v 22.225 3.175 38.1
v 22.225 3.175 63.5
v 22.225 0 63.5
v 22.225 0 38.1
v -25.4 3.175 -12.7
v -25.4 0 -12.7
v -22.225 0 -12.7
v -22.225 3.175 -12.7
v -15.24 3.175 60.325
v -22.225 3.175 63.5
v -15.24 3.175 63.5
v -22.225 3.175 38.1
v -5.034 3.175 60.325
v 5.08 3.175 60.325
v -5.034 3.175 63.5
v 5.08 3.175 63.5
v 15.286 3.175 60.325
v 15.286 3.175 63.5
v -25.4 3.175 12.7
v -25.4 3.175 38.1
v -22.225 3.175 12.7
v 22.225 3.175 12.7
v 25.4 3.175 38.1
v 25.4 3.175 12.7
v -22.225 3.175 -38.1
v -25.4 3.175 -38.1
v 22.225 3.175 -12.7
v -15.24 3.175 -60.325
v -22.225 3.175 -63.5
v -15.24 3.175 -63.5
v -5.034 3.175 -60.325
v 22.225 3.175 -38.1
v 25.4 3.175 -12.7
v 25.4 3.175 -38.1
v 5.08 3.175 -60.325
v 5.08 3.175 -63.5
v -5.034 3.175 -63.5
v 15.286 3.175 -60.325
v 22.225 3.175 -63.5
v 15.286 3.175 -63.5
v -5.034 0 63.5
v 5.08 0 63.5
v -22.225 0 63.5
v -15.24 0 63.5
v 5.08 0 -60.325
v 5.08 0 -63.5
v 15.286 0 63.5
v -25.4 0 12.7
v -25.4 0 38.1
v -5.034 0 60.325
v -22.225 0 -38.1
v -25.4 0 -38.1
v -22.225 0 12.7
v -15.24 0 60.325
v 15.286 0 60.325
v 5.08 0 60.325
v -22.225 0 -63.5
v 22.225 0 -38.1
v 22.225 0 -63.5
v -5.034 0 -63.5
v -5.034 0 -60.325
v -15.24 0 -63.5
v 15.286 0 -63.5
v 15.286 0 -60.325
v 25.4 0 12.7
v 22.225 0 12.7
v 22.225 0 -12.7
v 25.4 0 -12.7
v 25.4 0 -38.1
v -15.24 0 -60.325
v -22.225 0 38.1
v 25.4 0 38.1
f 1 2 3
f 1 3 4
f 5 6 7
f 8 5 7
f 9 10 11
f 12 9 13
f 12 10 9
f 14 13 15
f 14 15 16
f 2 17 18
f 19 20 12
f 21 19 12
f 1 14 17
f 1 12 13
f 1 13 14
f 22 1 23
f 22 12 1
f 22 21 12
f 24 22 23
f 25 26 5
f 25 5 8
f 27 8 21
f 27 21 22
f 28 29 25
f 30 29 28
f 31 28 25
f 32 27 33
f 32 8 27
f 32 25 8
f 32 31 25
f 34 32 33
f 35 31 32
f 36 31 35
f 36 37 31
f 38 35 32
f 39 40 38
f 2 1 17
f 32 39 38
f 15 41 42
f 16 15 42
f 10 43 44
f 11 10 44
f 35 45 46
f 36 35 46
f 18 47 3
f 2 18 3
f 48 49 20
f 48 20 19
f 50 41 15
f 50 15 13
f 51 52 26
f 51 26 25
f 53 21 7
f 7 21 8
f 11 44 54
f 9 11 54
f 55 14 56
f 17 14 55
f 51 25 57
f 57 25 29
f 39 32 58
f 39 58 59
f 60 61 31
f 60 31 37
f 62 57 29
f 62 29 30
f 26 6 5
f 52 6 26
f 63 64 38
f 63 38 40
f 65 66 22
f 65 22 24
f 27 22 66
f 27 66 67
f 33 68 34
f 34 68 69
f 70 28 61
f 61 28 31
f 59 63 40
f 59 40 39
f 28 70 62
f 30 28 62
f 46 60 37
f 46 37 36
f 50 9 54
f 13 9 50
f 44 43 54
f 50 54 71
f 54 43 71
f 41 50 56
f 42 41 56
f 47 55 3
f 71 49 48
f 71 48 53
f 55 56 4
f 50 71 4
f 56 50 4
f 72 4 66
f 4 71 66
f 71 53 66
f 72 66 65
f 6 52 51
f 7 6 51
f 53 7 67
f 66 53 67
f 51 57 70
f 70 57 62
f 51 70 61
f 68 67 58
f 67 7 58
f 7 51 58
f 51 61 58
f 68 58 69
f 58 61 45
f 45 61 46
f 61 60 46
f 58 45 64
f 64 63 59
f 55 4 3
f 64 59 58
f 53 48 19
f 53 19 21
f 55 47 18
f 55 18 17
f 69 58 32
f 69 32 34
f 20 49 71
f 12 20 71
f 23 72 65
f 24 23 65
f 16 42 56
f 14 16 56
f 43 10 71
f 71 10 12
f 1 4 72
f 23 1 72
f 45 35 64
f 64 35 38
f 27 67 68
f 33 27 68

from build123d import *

# Parameters (mm, degrees)
SKETCH1_W                 = 50.8
SKETCH1_H                 = 127
BOSS_EXTRUDE1_DEPTH       = 3.175
SKETCH2_W                 = 3.175
SKETCH2_H                 = 25.4
CUT_EXTRUDE1_DEPTH        = 3.175
LPATTERN1_COUNT           = 2
LPATTERN1_PITCH           = 50.8
LPATTERN2_COUNT           = 2
LPATTERN2_PITCH           = 50.8
SKETCH3_W                 = 3.175
SKETCH3_H                 = 25.4
CUT_EXTRUDE2_DEPTH        = 3.175
LPATTERN3_COUNT           = 2
LPATTERN3_PITCH           = 50.8
LPATTERN4_COPY_1_SKETCH_W = 3.175
LPATTERN4_COPY_1_SKETCH_H = 25.4
LPATTERN4_COPY_1_DEPTH    = 3.175
LPATTERN4_COPY_2_SKETCH_W = 3.175
LPATTERN4_COPY_2_SKETCH_H = 25.4
LPATTERN4_COPY_2_DEPTH    = 3.175
SKETCH6_W                 = 10.205647586
SKETCH6_H                 = 3.175
CUT_EXTRUDE3_DEPTH        = 3.175
LPATTERN5_COUNT           = 2
LPATTERN5_PITCH           = 20.32


with BuildPart() as part:
    # Sketch1 → Boss-Extrude1 (new body)
    with BuildSketch(Plane(origin=(0, 0, 0), x_dir=(1, 0, 0), z_dir=(0, 1, 0))):
        Rectangle(SKETCH1_W, SKETCH1_H)
    extrude(amount=BOSS_EXTRUDE1_DEPTH)

    # Sketch2 → Cut-Extrude1 (cut)
    with BuildSketch(Plane(origin=(0, 3.175, 0), x_dir=(1, 0, 0), z_dir=(0, 1, 0))):
        with Locations((-23.8125, 0)):
            Rectangle(SKETCH2_W, SKETCH2_H)
    cut_extrude1 = extrude(amount=-CUT_EXTRUDE1_DEPTH, mode=Mode.SUBTRACT)

    # LPattern1: Cut-Extrude1 ×2
    with Locations(*[(0, 0, -i * LPATTERN1_PITCH) for i in range(1, LPATTERN1_COUNT)]):
        add(cut_extrude1, mode=Mode.SUBTRACT)

    # LPattern2: Cut-Extrude1 ×2
    with Locations(*[(0, 0, i * LPATTERN2_PITCH) for i in range(1, LPATTERN2_COUNT)]):
        add(cut_extrude1, mode=Mode.SUBTRACT)

    # Sketch3 → Cut-Extrude2 (cut)
    with BuildSketch(Plane(origin=(0, 3.175, 0), x_dir=(1, 0, 0), z_dir=(0, 1, 0))):
        with Locations((23.8125, 50.8)):
            Rectangle(SKETCH3_W, SKETCH3_H)
    cut_extrude2 = extrude(amount=-CUT_EXTRUDE2_DEPTH, mode=Mode.SUBTRACT)

    # LPattern3: Cut-Extrude2 ×2
    with Locations(*[(0, 0, i * LPATTERN3_PITCH) for i in range(1, LPATTERN3_COUNT)]):
        add(cut_extrude2, mode=Mode.SUBTRACT)

    # LPattern4 copy 1 sketch → LPattern4 copy 1 (cut)
    with BuildSketch(Plane(origin=(0, 3.175, 101.6), x_dir=(1, 0, 0), z_dir=(0, 1, 0))):
        with Locations((23.8125, 50.8)):
            Rectangle(LPATTERN4_COPY_1_SKETCH_W, LPATTERN4_COPY_1_SKETCH_H)
    extrude(amount=-LPATTERN4_COPY_1_DEPTH, mode=Mode.SUBTRACT)

    # LPattern4 copy 2 sketch → LPattern4 copy 2 (cut)
    with BuildSketch(Plane(origin=(0, 3.175, 50.8), x_dir=(1, 0, 0), z_dir=(0, 1, 0))):
        with Locations((23.8125, 50.8)):
            Rectangle(LPATTERN4_COPY_2_SKETCH_W, LPATTERN4_COPY_2_SKETCH_H)
    extrude(amount=-LPATTERN4_COPY_2_DEPTH, mode=Mode.SUBTRACT)

    # Sketch6 → Cut-Extrude3 (cut)
    with BuildSketch(Plane(origin=(0, 3.175, 0), x_dir=(1, 0, 0), z_dir=(0, 1, 0))):
        with Locations((10.182823793, 61.9125)):
            Rectangle(SKETCH6_W, SKETCH6_H)
        with Locations((10.182823793, -61.9125)):
            Rectangle(SKETCH6_W, SKETCH6_H)
    cut_extrude3 = extrude(amount=-CUT_EXTRUDE3_DEPTH, mode=Mode.SUBTRACT)

    # LPattern5: Cut-Extrude3 ×2
    with Locations(*[(-i * LPATTERN5_PITCH, 0, 0) for i in range(1, LPATTERN5_COUNT)]):
        add(cut_extrude3, mode=Mode.SUBTRACT)


solid = part.part
